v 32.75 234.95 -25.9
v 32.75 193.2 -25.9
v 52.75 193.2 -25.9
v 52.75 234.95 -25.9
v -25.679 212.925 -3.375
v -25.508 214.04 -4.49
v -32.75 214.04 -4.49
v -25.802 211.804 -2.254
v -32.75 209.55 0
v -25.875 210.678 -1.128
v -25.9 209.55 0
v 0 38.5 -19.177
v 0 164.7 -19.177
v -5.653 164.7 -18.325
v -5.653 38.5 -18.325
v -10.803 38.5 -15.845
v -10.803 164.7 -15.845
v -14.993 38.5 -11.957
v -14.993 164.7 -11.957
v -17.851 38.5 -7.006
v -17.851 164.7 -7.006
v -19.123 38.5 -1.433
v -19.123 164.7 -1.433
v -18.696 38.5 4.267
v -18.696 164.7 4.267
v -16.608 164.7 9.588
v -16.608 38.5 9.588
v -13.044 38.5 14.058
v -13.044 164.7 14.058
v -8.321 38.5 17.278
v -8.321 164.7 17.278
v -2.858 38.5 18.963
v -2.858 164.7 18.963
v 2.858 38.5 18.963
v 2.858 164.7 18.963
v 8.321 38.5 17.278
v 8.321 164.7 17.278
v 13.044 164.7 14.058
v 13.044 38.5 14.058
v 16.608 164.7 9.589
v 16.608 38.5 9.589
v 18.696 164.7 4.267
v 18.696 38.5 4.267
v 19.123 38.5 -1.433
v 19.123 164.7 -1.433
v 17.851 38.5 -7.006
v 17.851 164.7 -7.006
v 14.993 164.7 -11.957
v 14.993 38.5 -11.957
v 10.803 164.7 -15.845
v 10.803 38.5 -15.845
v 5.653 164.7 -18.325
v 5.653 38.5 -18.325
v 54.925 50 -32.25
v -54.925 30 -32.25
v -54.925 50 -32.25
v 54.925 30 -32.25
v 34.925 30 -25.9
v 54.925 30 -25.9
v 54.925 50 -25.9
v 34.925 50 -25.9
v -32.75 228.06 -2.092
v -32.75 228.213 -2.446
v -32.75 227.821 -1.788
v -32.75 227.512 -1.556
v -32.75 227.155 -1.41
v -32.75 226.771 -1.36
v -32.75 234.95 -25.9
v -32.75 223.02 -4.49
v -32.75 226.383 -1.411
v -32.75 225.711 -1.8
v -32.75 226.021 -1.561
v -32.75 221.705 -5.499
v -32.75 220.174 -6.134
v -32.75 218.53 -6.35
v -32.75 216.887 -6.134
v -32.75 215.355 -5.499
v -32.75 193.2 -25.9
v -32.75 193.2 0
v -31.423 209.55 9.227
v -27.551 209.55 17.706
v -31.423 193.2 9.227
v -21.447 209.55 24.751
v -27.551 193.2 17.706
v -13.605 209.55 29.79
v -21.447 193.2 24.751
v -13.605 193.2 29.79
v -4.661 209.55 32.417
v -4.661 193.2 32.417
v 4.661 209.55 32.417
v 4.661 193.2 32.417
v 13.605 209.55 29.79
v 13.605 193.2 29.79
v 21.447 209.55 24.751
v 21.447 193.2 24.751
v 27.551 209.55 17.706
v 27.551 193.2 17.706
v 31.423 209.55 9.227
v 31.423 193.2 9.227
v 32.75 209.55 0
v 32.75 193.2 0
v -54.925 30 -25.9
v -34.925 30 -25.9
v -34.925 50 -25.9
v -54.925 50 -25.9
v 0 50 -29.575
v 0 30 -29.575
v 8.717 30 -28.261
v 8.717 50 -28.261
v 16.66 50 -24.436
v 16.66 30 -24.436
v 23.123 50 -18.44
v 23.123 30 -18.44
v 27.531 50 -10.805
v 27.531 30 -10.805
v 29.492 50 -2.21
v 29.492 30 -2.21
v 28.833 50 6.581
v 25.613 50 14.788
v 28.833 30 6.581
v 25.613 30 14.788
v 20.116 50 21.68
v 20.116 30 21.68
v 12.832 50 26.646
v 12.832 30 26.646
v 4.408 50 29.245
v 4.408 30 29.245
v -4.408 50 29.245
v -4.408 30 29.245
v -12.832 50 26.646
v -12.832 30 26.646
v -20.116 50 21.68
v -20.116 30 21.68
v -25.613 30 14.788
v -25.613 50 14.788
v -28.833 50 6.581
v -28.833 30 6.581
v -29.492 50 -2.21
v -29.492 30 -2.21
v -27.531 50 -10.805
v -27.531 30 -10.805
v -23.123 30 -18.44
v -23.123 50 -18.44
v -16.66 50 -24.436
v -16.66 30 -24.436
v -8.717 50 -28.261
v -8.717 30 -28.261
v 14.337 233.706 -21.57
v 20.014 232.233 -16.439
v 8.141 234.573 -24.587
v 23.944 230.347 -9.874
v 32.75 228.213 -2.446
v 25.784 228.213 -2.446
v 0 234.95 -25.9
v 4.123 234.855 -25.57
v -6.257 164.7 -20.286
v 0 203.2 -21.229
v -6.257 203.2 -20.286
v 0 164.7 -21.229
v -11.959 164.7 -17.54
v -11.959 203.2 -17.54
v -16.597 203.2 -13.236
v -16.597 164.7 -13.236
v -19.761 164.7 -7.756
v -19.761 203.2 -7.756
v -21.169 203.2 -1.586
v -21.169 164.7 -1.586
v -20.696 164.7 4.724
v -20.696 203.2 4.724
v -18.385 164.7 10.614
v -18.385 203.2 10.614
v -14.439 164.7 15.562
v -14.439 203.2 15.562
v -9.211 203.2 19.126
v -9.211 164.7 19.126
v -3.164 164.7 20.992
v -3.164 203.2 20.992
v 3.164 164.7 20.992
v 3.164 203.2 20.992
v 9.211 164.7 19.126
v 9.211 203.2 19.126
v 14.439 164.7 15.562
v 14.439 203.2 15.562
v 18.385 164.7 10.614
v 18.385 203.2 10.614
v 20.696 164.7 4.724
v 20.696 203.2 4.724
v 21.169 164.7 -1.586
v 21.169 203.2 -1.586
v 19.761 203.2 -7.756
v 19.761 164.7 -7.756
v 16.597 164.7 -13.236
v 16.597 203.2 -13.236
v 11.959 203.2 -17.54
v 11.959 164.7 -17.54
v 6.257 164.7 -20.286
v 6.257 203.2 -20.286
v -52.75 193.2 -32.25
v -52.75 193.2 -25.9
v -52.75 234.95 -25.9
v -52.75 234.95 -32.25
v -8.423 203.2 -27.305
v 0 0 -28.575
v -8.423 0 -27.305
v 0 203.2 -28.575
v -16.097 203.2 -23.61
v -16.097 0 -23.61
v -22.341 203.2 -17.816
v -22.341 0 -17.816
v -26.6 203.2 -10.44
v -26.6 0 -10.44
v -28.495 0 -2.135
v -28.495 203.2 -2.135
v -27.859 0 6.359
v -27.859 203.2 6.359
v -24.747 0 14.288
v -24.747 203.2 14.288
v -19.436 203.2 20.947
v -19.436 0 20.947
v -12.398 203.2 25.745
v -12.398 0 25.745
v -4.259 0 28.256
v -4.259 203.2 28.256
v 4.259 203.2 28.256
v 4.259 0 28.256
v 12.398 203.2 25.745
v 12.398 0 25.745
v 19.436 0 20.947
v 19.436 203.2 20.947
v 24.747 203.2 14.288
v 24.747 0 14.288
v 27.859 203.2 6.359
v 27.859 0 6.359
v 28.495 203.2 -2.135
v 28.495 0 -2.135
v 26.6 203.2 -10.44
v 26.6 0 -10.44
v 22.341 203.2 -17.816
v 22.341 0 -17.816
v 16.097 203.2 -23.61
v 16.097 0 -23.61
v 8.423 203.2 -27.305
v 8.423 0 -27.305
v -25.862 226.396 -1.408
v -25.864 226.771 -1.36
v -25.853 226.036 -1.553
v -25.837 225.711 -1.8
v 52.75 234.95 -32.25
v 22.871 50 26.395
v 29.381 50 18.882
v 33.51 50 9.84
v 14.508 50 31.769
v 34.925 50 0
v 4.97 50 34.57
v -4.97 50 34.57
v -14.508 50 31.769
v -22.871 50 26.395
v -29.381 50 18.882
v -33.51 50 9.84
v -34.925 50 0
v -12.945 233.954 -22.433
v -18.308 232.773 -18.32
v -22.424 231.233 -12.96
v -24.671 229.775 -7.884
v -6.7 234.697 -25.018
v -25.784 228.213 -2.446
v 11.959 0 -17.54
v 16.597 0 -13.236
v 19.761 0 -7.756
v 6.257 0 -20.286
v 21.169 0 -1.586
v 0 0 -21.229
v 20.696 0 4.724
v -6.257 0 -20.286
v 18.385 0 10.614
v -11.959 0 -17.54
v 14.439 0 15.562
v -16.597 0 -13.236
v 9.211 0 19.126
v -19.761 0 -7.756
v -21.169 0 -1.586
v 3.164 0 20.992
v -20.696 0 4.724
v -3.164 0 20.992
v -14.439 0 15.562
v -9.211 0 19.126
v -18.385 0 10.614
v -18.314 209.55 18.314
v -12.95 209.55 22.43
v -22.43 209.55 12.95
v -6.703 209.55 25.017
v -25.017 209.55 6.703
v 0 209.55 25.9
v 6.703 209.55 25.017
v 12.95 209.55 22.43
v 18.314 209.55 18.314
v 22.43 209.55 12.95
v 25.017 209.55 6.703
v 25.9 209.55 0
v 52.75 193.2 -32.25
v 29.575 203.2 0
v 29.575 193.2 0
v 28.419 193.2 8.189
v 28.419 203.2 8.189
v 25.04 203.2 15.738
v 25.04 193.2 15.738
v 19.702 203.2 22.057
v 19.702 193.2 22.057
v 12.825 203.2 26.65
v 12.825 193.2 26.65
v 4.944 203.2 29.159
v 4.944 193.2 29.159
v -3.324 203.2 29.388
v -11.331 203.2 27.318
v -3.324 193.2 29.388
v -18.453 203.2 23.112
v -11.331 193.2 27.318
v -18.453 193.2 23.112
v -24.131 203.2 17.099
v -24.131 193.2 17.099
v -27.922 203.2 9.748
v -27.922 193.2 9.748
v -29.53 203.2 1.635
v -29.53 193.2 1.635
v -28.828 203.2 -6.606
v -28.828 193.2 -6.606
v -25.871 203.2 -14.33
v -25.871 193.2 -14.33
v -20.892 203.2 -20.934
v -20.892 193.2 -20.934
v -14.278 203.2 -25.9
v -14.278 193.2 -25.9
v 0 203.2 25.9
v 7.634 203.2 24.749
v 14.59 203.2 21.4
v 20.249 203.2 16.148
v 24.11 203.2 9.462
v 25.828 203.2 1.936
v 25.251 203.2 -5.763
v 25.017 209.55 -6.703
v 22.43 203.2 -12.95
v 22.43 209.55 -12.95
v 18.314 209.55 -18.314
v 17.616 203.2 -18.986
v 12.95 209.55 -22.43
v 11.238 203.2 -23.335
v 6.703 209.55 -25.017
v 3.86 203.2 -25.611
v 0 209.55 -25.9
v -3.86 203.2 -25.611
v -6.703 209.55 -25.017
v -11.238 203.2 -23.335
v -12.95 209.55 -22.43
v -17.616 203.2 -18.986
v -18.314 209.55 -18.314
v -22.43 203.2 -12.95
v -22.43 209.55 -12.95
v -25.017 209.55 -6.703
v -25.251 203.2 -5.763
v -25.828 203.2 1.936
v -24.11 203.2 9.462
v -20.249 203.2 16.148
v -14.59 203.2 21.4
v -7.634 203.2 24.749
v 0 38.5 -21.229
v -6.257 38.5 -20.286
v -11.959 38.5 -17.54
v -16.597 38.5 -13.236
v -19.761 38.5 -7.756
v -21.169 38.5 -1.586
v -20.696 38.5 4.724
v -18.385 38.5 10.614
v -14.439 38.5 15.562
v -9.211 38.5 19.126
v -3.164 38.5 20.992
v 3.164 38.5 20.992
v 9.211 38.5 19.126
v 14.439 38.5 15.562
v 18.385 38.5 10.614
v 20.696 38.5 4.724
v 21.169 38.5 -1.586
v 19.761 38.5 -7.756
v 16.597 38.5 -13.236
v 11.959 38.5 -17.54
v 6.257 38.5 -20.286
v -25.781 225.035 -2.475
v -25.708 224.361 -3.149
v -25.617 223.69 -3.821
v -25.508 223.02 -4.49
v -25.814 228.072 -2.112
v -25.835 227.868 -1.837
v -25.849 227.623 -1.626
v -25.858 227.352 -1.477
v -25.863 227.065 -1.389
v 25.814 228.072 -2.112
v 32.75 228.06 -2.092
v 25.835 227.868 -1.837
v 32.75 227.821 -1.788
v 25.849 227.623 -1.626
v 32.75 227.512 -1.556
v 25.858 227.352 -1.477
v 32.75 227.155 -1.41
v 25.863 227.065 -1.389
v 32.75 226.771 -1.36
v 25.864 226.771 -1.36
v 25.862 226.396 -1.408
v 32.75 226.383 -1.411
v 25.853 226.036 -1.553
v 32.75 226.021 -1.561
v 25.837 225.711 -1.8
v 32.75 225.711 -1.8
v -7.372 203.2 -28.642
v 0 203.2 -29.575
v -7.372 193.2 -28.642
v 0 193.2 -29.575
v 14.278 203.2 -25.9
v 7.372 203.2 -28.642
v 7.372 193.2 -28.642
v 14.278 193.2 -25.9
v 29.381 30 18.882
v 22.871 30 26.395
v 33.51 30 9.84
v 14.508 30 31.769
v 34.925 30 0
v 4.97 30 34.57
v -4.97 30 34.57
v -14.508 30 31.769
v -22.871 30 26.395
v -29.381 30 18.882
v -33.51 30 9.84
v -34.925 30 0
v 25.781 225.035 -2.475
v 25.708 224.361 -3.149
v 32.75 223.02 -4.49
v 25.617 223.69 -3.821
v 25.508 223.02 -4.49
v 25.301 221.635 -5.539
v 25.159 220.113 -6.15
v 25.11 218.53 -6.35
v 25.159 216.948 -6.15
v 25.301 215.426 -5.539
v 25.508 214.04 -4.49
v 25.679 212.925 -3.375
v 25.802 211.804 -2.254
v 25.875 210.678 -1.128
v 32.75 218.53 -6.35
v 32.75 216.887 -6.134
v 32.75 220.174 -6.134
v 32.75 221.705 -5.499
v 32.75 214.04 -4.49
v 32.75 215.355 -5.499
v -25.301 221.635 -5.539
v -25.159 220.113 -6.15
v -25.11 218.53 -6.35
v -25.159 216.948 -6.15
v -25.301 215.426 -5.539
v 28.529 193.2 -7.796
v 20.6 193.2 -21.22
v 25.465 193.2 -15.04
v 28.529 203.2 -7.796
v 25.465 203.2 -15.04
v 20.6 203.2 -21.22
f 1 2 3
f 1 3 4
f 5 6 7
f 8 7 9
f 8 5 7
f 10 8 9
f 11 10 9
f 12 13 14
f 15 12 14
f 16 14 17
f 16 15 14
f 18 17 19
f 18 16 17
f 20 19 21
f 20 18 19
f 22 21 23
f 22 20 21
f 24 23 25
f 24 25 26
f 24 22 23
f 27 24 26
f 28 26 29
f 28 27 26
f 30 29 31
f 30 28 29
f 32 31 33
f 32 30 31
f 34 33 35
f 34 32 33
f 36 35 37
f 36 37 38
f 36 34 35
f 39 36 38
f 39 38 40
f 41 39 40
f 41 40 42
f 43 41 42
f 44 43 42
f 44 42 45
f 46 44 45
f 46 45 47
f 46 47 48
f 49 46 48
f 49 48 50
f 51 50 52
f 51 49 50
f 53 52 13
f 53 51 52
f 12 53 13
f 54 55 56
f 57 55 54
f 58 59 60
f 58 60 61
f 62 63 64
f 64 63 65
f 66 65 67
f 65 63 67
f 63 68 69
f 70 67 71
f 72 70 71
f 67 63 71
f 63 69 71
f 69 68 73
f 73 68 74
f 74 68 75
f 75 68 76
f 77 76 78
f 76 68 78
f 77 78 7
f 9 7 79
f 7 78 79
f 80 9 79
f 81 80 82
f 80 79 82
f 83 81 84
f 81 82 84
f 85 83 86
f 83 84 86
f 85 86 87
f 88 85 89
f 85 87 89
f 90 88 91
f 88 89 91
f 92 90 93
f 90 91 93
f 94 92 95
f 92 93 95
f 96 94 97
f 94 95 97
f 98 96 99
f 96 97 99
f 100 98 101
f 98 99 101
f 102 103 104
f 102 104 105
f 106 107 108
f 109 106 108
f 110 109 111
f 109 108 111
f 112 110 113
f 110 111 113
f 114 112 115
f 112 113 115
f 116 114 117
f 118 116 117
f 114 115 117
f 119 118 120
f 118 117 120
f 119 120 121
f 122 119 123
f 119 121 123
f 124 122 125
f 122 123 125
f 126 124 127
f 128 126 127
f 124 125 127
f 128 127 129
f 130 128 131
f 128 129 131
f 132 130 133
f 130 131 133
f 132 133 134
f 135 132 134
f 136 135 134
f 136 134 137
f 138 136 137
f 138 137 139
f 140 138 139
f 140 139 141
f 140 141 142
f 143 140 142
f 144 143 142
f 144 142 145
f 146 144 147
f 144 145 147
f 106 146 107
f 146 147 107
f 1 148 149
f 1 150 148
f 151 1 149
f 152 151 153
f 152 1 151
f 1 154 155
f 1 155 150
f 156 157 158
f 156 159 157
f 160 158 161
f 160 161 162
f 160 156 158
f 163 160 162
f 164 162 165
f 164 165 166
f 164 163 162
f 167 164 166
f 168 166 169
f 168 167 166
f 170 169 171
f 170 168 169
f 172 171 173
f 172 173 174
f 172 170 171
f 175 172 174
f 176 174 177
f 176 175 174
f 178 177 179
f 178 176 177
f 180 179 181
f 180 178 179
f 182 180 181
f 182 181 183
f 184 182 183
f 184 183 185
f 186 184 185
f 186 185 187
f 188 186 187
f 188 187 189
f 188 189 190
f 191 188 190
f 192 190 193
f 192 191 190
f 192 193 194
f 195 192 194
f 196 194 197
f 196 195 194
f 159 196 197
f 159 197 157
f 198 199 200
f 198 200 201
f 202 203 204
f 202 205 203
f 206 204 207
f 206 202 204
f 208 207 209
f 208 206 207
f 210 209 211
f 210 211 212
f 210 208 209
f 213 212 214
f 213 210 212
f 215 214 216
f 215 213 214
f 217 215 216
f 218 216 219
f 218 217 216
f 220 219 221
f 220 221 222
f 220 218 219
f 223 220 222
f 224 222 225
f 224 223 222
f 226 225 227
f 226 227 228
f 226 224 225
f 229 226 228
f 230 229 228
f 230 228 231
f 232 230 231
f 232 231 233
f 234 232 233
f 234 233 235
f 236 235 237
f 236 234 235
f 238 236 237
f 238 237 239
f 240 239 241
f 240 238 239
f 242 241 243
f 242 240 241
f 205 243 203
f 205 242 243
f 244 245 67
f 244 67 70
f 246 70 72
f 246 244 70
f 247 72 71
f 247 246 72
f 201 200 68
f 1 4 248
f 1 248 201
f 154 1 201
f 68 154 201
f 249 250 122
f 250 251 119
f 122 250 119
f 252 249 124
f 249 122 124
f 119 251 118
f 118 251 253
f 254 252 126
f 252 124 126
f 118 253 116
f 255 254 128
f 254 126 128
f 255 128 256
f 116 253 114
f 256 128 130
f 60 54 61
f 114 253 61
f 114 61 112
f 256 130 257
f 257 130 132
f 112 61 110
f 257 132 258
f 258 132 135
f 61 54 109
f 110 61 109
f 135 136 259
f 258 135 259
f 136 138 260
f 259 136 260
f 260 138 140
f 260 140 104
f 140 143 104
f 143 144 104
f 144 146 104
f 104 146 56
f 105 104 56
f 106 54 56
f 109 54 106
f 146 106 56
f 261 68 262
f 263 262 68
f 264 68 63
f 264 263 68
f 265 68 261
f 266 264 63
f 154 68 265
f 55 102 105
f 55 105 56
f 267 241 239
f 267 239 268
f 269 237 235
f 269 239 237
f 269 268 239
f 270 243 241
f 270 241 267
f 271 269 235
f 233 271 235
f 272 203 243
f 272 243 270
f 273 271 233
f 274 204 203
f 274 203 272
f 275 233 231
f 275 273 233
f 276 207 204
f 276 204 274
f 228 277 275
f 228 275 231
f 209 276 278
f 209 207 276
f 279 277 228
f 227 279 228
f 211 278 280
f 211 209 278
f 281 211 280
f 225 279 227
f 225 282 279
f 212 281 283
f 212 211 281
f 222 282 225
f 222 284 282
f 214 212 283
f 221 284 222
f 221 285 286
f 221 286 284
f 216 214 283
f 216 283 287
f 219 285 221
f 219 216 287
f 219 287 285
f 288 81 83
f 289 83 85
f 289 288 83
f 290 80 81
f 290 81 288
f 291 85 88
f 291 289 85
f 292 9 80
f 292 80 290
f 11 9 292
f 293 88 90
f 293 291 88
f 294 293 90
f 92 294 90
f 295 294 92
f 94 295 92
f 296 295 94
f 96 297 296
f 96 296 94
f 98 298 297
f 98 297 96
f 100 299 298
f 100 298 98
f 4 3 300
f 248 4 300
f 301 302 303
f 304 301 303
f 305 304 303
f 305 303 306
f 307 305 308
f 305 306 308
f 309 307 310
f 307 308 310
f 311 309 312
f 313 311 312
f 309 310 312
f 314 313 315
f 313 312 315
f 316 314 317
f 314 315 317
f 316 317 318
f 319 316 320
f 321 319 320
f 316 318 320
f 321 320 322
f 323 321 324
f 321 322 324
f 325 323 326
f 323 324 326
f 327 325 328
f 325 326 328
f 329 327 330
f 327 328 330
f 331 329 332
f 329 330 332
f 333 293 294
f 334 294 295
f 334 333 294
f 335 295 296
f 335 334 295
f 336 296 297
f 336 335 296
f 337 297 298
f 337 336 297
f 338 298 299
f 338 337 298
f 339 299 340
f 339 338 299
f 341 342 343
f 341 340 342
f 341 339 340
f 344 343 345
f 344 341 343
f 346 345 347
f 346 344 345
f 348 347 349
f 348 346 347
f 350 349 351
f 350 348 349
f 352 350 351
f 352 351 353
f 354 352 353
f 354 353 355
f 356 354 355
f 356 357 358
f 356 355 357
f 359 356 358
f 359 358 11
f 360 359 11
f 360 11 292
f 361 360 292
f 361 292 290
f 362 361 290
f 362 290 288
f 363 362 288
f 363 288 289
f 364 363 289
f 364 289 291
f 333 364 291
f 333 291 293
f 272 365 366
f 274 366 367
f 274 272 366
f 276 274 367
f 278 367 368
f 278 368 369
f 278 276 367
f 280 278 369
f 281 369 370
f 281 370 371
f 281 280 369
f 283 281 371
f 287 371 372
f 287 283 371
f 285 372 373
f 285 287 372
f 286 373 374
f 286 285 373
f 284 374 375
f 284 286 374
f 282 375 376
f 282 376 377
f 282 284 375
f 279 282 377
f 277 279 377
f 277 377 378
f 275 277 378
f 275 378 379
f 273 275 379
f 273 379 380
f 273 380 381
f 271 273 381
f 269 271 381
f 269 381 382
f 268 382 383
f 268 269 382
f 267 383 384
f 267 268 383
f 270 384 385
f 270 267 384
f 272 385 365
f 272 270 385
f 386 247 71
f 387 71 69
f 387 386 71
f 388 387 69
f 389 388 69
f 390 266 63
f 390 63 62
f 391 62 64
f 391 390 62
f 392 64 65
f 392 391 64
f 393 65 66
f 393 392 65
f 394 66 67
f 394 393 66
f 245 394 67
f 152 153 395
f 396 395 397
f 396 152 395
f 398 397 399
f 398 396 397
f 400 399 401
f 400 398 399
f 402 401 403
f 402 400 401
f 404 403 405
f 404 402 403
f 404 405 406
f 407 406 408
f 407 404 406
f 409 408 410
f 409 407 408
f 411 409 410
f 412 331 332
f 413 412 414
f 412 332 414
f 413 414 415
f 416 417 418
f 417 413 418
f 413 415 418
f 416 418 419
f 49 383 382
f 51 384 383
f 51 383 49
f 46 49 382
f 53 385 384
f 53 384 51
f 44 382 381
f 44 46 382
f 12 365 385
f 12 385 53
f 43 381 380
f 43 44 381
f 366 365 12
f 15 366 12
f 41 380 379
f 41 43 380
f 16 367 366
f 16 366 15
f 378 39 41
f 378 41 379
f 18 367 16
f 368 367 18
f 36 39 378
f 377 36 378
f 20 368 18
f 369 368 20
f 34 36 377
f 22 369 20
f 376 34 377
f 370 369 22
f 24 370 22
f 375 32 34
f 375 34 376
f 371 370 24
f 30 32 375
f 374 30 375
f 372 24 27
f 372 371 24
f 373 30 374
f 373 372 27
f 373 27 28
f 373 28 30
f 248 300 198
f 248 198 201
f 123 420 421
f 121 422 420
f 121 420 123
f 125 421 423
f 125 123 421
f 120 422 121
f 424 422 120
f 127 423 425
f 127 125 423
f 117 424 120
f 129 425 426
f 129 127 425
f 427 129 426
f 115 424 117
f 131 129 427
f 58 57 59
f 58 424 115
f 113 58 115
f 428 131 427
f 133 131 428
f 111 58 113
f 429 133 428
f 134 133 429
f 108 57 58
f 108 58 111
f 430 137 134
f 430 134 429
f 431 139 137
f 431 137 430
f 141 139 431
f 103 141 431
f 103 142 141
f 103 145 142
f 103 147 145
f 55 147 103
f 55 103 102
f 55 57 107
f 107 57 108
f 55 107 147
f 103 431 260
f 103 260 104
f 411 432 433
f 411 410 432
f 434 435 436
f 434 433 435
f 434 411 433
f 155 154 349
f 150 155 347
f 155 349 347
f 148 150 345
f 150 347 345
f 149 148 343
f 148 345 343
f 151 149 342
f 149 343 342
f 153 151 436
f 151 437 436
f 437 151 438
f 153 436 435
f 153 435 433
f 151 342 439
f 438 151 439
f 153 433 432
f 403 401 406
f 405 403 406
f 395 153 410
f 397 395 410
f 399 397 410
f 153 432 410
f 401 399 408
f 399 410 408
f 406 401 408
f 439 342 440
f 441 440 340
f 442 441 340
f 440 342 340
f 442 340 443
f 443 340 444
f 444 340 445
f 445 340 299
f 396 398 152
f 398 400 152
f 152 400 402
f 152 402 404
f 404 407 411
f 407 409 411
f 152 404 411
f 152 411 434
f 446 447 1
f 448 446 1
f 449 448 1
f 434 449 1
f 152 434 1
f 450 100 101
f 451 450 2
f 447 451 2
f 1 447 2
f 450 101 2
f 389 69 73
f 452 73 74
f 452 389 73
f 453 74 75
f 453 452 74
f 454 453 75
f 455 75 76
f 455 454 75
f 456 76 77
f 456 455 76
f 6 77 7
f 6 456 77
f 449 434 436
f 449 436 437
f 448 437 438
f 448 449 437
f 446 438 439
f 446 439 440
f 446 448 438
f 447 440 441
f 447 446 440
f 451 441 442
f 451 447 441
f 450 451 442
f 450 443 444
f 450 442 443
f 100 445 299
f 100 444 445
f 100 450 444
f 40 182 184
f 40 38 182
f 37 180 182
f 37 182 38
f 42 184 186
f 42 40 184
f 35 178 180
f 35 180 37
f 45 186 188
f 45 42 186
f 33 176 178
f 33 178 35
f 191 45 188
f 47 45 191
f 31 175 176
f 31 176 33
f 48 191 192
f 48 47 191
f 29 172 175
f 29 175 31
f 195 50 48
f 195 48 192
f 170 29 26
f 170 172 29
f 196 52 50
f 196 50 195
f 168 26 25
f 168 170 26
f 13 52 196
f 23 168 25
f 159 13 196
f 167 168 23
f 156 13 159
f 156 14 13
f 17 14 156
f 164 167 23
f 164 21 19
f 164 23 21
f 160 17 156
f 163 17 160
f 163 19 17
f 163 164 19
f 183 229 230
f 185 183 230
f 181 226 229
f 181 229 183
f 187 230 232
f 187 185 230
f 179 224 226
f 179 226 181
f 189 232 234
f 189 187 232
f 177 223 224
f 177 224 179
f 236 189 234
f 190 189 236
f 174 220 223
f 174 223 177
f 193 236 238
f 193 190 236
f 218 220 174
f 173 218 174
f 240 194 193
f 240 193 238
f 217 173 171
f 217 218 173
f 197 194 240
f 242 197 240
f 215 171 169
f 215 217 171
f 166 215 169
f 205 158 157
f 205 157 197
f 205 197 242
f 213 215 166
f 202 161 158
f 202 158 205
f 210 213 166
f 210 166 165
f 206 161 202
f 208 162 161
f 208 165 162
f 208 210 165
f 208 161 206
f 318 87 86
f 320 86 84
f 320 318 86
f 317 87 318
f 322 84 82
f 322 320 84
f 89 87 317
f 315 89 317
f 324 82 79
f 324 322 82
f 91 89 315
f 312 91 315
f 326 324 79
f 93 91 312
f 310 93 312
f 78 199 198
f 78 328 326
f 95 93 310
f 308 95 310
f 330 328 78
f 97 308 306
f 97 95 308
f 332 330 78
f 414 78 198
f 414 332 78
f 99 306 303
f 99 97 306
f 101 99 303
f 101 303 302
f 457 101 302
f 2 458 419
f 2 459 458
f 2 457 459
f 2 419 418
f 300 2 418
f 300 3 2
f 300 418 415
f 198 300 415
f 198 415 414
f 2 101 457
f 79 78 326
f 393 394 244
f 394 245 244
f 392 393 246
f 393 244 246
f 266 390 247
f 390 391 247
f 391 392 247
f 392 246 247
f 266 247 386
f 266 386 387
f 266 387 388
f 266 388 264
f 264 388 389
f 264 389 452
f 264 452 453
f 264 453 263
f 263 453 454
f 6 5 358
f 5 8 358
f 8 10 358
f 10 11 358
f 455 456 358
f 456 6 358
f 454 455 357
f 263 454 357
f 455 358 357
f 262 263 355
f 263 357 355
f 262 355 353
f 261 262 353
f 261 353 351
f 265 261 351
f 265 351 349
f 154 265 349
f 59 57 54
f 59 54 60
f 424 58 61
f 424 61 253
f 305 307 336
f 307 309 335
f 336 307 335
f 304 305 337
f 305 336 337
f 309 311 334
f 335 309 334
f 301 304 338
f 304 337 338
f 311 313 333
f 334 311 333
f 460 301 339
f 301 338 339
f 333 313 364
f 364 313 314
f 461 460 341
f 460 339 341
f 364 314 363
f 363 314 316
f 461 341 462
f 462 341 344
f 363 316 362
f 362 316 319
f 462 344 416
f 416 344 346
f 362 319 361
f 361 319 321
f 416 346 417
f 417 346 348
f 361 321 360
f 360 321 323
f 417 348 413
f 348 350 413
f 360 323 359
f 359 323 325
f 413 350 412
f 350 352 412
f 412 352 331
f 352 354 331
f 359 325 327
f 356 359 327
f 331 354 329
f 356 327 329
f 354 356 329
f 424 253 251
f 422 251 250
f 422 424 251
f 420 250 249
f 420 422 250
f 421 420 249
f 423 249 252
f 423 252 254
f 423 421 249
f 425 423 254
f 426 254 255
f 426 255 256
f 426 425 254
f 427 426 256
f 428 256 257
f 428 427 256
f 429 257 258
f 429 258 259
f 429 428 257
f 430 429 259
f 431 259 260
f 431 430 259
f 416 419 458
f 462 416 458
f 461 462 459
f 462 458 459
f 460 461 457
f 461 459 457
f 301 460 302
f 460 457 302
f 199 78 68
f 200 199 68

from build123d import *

# Parameters (mm, degrees)
BOSS_EXTRUDE1_DEPTH     = 10
SKETCH16_R              = 29.575
SKETCH16_R_2            = 25.9
BOSS_EXTRUDE2_DEPTH     = 6.35
BOSS_EXTRUDE3_DEPTH     = 25.4
CUT_EXTRUDE1_DEPTH      = 247.098181627
CUT_EXTRUDE1_DEPTH_BACK = 247.098181627
SKETCH19_W              = 6.35
SKETCH19_H              = 41.75
BOSS_EXTRUDE5_DEPTH     = 20
SKETCH20_R              = 29.575
BOSS_EXTRUDE6_DEPTH     = 20


with BuildPart() as part:
    # Sketch12 → Revolve1 (revolve)
    with BuildSketch(Plane.XY, mode=Mode.PRIVATE) as revolve1_sk:
        Polygon((-28.575, 0), (-28.575, 203.2), (-21.22866, 203.2), (-21.22866, 164.7), (-19.177, 164.7), (-19.177, 38.5), (-21.22866, 38.5), (-21.22866, 0), align=None)
    revolve(revolve1_sk.sketch.rotate(Axis((0, 0, 0), (0, 1, 0)), 270), axis=Axis((0, 0, 0), (0, 1, 0)))


with BuildPart() as body_2:
    # Sketch15 → Boss-Extrude1 (new body)
    with BuildSketch(Plane(origin=(0, 193.2, 0), x_dir=(1, 0, 0), z_dir=(0, 1, 0))):
        with BuildLine():
            Line((-32.75, 32.25), (-32.75, 25.9))
            Line((-32.75, 25.9), (-20.043764616, 25.9))
            ThreePointArc((-20.043764616, 25.9), (-13.258102036, 29.946372575), (-5.700877125, 32.25))
            Line((-5.700877125, 32.25), (-32.75, 32.25))
        make_face()
        with BuildLine():
            Line((-32.75, 25.9), (-32.75, 0))
            ThreePointArc((-32.75, 0), (-29.40234507, 14.424444683), (-20.043764616, 25.9))
            Line((-20.043764616, 25.9), (-32.75, 25.9))
        make_face()
        with BuildLine():
            Line((20.043764616, 25.9), (32.75, 25.9))
            Line((32.75, 25.9), (32.75, 32.25))
            Line((32.75, 32.25), (5.700877125, 32.25))
            ThreePointArc((5.700877125, 32.25), (13.258102036, 29.946372575), (20.043764616, 25.9))
        make_face()
        with BuildLine():
            ThreePointArc((20.043764616, 25.9), (29.40234507, 14.424444683), (32.75, 0))
            Line((32.75, 0), (32.75, 25.9))
            Line((32.75, 25.9), (20.043764616, 25.9))
        make_face()
        with BuildLine():
            ThreePointArc((-32.75, 0), (0, -32.75), (32.75, 0))
            ThreePointArc((32.75, 0), (29.40234507, 14.424444683), (20.043764616, 25.9))
            Line((20.043764616, 25.9), (14.278327108, 25.9))
            ThreePointArc((14.278327108, 25.9), (25.465291567, 15.039931861), (29.575, 0))
            ThreePointArc((29.575, 0), (-15.039931861, -25.465291567), (-14.278327108, 25.9))
            Line((-14.278327108, 25.9), (-20.043764616, 25.9))
            ThreePointArc((-20.043764616, 25.9), (-29.40234507, 14.424444683), (-32.75, 0))
        make_face()
        with BuildLine():
            Line((14.278327108, 25.9), (20.043764616, 25.9))
            ThreePointArc((20.043764616, 25.9), (13.258102036, 29.946372575), (5.700877125, 32.25))
            Line((5.700877125, 32.25), (-5.700877125, 32.25))
            ThreePointArc((-5.700877125, 32.25), (-13.258102036, 29.946372575), (-20.043764616, 25.9))
            Line((-20.043764616, 25.9), (-14.278327108, 25.9))
            ThreePointArc((-14.278327108, 25.9), (0, 29.575), (14.278327108, 25.9))
        make_face()
    extrude(amount=BOSS_EXTRUDE1_DEPTH)

    # Sketch16 → Boss-Extrude2 (add)
    # profile 1 of 4: a face of its own
    with BuildSketch(Plane(origin=(0, 203.2, 0), x_dir=(1, 0, 0), z_dir=(0, 1, 0))):
        with BuildLine():
            ThreePointArc((5.700877125, 32.25), (25.092491166, 21.045887652), (32.75, 0))
            Line((32.75, 0), (32.75, 32.25))
            Line((32.75, 32.25), (5.700877125, 32.25))
        make_face()
    # profile 2 of 4: a face of its own
    with BuildSketch(Plane(origin=(0, 203.2, 0), x_dir=(1, 0, 0), z_dir=(0, 1, 0))):
        with BuildLine():
            Line((-32.75, 32.25), (-32.75, 0))
            ThreePointArc((-32.75, 0), (-25.092491166, 21.045887652), (-5.700877125, 32.25))
            Line((-5.700877125, 32.25), (-32.75, 32.25))
        make_face()
    # profile 3 of 4: a face of its own
    with BuildSketch(Plane(origin=(0, 203.2, 0), x_dir=(1, 0, 0), z_dir=(0, 1, 0))):
        with BuildLine():
            ThreePointArc((-32.75, 0), (0, -32.75), (32.75, 0))
            ThreePointArc((32.75, 0), (25.092491166, 21.045887652), (5.700877125, 32.25))
            Line((5.700877125, 32.25), (-5.700877125, 32.25))
            ThreePointArc((-5.700877125, 32.25), (-25.092491166, 21.045887652), (-32.75, 0))
        make_face()
        with Locations(Location((0, 0, 0), (0, 0, 90))):
            Circle(SKETCH16_R, mode=Mode.SUBTRACT)
    # profile 4 of 4: a face of its own
    with BuildSketch(Plane(origin=(0, 203.2, 0), x_dir=(1, 0, 0), z_dir=(0, 1, 0))):
        with Locations(Location((0, 0, 0), (0, 0, 90))):
            Circle(SKETCH16_R)
        with Locations(Location((0, 0, 0), (0, 0, 270))):
            Circle(SKETCH16_R_2, mode=Mode.SUBTRACT)
    extrude(amount=BOSS_EXTRUDE2_DEPTH)

    # Sketch17 → Boss-Extrude3 (add)
    with BuildSketch(Plane(origin=(0, 209.55, 0), x_dir=(1, 0, 0), z_dir=(0, 1, 0))):
        Polygon((0, 25.9), (32.75, 25.9), (32.75, 32.25), (-32.75, 32.25), (-32.75, 25.9), align=None)
        with BuildLine():
            Line((32.75, 0), (32.75, 25.9))
            Line((32.75, 25.9), (0, 25.9))
            ThreePointArc((0, 25.9), (18.314065633, 18.314065633), (25.9, 0))
            Line((25.9, 0), (32.75, 0))
        make_face()
        with BuildLine():
            ThreePointArc((-25.9, 0), (-18.314065633, 18.314065633), (0, 25.9))
            Line((0, 25.9), (-32.75, 25.9))
            Line((-32.75, 25.9), (-32.75, 0))
            Line((-32.75, 0), (-25.9, 0))
        make_face()
    extrude(amount=BOSS_EXTRUDE3_DEPTH)

    # Sketch18 → Cut-Extrude1 (cut, two sides: drawn at the far end of the back side and taken through both)
    with BuildSketch(Plane.ZY.offset(32.75).offset(-CUT_EXTRUDE1_DEPTH_BACK)):
        with BuildLine():
            Line((0, 224.880256121), (0, 227.510512242))
            Line((0, 227.510512242), (-1.799705242, 225.710807))
            Line((-1.799705242, 225.710807), (-4.490128061, 223.020384182))
            ThreePointArc((-4.490128061, 223.020384182), (-2.430039796, 224.396891152), (0, 224.880256121))
        make_face()
        with BuildLine():
            Line((0, 227.510512242), (-2.446251923, 228.213170977))
            ThreePointArc((-2.446251923, 228.213170977), (-1.662206389, 227.673916492), (-1.360365456, 226.77146713))
            ThreePointArc((-1.360365456, 226.77146713), (-1.474546145, 226.197442009), (-1.799705242, 225.710807))
            Line((-1.799705242, 225.710807), (0, 227.510512242))
        make_face()
        with BuildLine():
            ThreePointArc((6.35, 218.530256121), (4.490128061, 223.020384182), (0, 224.880256121))
            Line((0, 224.880256121), (0, 212.180256121))
            ThreePointArc((0, 212.180256121), (4.490128061, 214.04012806), (6.35, 218.530256121))
        make_face()
        with BuildLine():
            Line((0, 212.180256121), (0, 224.880256121))
            ThreePointArc((0, 224.880256121), (-2.430039796, 224.396891152), (-4.490128061, 223.020384182))
            ThreePointArc((-4.490128061, 223.020384182), (-6.35, 218.530256121), (-4.490128061, 214.04012806))
            ThreePointArc((-4.490128061, 214.04012806), (-2.430039796, 212.66362109), (0, 212.180256121))
        make_face()
        with BuildLine():
            Line((0, 209.55), (0, 212.180256121))
            ThreePointArc((0, 212.180256121), (-2.430039796, 212.66362109), (-4.490128061, 214.04012806))
            Line((-4.490128061, 214.04012806), (0, 209.55))
        make_face()
        Polygon((0, 234.95), (-25.9, 234.95), (-2.446251923, 228.213170977), (0, 227.510512242), align=None)
    extrude(amount=CUT_EXTRUDE1_DEPTH + CUT_EXTRUDE1_DEPTH_BACK, mode=Mode.SUBTRACT)

    # Sketch19 → Boss-Extrude5 (add)
    with BuildSketch(Plane(origin=(32.75, 0, 0), x_dir=(0, 0, -1), z_dir=(1, 0, 0))):
        with Locations((29.075, 214.075)):
            Rectangle(SKETCH19_W, SKETCH19_H)
    boss_extrude5 = extrude(amount=BOSS_EXTRUDE5_DEPTH)

    # Mirror1: Boss-Extrude5 across plane
    add(boss_extrude5.mirror(Plane(origin=(0, 0, 0), x_dir=(0, 0, 1), z_dir=(1, 0, 0))))


with BuildPart() as body_3:
    # Sketch20 → Boss-Extrude6 (new body)
    with BuildSketch(Plane(origin=(0, 30, 0), x_dir=(-1, 0, 0), z_dir=(0, -1, 0))):
        with BuildLine():
            ThreePointArc((-34.925, 0), (0, -34.925), (34.925, 0))
            Line((34.925, 0), (34.925, 25.9))
            Line((34.925, 25.9), (54.925, 25.9))
            Line((54.925, 25.9), (54.925, 32.25))
            Line((54.925, 32.25), (-54.925, 32.25))
            Line((-54.925, 32.25), (-54.925, 25.9))
            Line((-54.925, 25.9), (-34.925, 25.9))
            Line((-34.925, 25.9), (-34.925, 0))
        make_face()
        with Locations(Location((0, 0, 0), (0, 0, 90))):
            Circle(SKETCH20_R, mode=Mode.SUBTRACT)
    extrude(amount=-BOSS_EXTRUDE6_DEPTH)


solid = Compound([part.part, body_2.part, body_3.part])
